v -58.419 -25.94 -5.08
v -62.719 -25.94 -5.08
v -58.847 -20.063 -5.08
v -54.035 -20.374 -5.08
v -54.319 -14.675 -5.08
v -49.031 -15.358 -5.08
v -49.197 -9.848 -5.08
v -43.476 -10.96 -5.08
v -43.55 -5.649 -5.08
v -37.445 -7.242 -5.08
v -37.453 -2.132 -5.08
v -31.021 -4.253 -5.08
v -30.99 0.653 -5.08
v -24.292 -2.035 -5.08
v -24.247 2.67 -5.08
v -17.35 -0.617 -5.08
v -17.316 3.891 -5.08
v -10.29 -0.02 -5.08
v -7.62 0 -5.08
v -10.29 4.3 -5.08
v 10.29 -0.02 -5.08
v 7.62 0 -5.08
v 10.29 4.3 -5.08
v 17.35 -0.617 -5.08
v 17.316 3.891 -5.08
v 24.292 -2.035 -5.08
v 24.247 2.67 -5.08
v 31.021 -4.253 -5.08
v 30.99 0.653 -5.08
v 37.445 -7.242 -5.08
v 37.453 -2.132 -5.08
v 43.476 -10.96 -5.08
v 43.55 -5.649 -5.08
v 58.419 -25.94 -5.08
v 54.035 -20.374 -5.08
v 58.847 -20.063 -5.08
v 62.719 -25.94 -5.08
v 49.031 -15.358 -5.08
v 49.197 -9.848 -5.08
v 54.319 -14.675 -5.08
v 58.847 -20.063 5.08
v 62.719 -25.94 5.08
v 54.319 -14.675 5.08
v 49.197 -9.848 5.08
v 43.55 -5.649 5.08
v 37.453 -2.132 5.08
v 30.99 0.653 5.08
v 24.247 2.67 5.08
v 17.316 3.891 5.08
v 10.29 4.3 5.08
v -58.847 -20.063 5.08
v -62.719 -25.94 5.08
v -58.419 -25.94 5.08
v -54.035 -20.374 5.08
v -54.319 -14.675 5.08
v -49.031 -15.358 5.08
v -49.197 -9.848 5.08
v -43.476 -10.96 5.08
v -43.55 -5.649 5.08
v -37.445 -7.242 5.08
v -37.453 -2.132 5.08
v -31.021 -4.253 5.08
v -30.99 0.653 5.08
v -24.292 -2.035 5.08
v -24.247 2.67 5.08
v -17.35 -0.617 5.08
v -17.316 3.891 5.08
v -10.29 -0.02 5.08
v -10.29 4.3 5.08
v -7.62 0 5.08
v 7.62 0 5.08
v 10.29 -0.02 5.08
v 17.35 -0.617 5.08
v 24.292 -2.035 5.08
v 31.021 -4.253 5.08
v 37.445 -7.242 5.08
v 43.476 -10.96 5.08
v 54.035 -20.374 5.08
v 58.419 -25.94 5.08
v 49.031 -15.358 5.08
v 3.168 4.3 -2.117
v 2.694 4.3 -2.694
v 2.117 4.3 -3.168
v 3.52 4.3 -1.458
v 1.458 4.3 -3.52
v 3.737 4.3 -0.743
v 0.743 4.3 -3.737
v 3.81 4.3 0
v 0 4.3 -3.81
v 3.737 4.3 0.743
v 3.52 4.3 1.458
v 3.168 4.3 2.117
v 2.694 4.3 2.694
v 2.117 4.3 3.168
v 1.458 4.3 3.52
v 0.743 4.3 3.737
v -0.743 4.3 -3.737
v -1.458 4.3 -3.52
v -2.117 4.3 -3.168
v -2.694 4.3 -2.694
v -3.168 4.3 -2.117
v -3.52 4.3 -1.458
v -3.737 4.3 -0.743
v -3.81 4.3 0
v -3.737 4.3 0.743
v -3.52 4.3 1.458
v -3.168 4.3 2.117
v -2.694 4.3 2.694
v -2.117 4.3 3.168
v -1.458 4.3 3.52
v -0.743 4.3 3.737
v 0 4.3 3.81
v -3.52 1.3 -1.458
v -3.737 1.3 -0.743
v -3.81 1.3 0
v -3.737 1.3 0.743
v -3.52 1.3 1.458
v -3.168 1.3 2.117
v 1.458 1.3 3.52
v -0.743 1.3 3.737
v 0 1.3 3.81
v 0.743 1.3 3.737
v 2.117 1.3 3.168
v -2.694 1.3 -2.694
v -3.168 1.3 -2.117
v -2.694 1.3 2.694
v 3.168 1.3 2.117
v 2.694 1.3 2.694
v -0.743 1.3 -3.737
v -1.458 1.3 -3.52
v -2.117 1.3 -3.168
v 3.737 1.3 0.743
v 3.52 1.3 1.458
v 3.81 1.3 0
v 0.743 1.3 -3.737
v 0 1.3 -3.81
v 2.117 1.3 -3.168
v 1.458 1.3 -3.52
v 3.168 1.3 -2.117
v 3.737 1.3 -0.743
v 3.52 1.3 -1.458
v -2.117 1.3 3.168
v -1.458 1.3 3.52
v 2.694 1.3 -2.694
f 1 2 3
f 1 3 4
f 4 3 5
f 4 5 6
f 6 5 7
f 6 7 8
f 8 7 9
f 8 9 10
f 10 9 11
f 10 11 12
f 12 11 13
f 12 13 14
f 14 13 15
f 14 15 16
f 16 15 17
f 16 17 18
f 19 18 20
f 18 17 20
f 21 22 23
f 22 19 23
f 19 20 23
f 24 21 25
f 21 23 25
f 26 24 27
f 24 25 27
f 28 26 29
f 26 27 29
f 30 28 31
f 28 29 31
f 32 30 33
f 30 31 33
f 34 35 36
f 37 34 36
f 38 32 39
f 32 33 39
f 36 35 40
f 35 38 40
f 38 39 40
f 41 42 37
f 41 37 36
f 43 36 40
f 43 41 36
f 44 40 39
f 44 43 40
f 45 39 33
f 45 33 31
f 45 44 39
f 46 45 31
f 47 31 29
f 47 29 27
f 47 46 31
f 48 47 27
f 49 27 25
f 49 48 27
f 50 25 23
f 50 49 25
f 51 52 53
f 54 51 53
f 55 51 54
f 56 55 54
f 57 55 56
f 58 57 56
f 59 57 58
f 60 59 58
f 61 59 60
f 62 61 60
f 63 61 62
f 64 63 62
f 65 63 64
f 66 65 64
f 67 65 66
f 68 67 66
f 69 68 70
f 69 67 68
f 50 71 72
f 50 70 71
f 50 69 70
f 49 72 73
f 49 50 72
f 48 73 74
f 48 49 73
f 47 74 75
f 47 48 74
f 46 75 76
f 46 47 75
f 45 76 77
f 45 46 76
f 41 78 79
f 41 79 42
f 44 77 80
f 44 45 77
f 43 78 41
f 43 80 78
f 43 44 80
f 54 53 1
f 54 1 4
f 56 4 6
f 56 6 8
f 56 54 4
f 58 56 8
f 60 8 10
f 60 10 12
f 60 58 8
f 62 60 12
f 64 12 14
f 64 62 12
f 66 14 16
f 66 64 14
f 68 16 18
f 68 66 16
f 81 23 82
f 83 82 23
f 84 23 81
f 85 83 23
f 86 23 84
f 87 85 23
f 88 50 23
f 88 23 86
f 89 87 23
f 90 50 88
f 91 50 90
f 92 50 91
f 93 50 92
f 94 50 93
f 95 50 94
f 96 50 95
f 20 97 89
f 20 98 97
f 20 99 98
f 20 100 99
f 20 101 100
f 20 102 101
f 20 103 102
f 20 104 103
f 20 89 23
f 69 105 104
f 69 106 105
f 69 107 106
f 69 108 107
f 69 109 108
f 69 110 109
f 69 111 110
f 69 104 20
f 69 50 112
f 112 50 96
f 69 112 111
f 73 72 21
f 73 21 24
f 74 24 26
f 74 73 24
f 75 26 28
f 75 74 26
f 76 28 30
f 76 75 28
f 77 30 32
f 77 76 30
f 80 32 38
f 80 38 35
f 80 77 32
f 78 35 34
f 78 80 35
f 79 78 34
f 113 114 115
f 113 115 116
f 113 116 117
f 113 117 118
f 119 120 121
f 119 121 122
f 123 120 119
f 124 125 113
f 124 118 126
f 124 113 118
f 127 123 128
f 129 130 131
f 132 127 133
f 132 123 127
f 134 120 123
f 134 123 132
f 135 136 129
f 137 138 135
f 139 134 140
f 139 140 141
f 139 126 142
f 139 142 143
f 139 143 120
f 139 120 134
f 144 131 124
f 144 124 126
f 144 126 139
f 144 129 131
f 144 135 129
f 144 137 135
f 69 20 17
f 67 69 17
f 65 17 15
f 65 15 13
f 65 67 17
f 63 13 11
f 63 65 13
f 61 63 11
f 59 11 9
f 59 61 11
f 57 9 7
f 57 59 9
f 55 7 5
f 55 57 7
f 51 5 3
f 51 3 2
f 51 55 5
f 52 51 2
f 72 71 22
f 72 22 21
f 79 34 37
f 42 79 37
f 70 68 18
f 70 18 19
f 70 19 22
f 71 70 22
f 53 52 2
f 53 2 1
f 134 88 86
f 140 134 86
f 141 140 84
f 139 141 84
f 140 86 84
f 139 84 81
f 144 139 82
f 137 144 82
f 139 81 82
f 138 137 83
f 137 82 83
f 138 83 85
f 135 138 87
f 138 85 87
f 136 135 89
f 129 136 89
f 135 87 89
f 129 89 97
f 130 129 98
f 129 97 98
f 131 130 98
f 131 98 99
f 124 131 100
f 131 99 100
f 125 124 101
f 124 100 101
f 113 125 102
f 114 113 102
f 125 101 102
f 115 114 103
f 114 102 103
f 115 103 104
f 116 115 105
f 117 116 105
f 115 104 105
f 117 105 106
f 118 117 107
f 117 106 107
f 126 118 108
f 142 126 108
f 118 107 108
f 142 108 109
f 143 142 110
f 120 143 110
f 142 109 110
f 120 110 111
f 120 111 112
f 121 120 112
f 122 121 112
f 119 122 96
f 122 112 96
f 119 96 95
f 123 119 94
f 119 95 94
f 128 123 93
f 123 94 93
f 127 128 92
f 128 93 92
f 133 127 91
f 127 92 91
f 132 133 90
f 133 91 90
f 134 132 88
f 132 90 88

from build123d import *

# Parameters (mm, degrees)
SKETCH1_W           = 15.24
SKETCH1_H           = 10.16
BOSS_EXTRUDE1_DEPTH = 4.3
BOSS_EXTRUDE2_DEPTH = 10.16
SKETCH3_R           = 3.81
CUT_EXTRUDE1_DEPTH  = 3


with BuildPart() as part:
    # Sketch1 → Boss-Extrude1 (new body)
    with BuildSketch(Plane(origin=(0, 0, 0), x_dir=(1, 0, 0), z_dir=(0, 1, 0))):
        Rectangle(SKETCH1_W, SKETCH1_H)
    extrude(amount=BOSS_EXTRUDE1_DEPTH)

    # Sketch2 → Boss-Extrude2 (add)
    with BuildSketch(Plane.XY.offset(5.08)):
        with BuildLine():
            Line((7.62, 4.3), (7.62, 0))
            Line((7.62, 0), (10.29, -0.020216112))
            ThreePointArc((10.29, -0.020216112), (37.444945357, -7.24175572), (58.419152196, -25.94))
            Line((58.419152196, -25.94), (62.719152196, -25.94))
            ThreePointArc((62.719152196, -25.94), (40.552491636, -3.80185252), (10.29, 4.3))
            Line((10.29, 4.3), (7.62, 4.3))
        make_face()
        with BuildLine():
            ThreePointArc((-10.29, 4.3), (-40.552491636, -3.80185252), (-62.719152196, -25.94))
            Line((-62.719152196, -25.94), (-58.419152196, -25.94))
            ThreePointArc((-58.419152196, -25.94), (-37.444945357, -7.24175572), (-10.29, -0.020216112))
            Line((-10.29, -0.020216112), (-7.62, 0))
            Line((-7.62, 0), (-7.62, 4.3))
            Line((-7.62, 4.3), (-10.29, 4.3))
        make_face()
    extrude(amount=-BOSS_EXTRUDE2_DEPTH)

    # Sketch3 → Cut-Extrude1 (cut)
    with BuildSketch(Plane(origin=(0, 4.3, 0), x_dir=(1, 0, 0), z_dir=(0, 1, 0))):
        Circle(SKETCH3_R)
    extrude(amount=-CUT_EXTRUDE1_DEPTH, mode=Mode.SUBTRACT)


solid = part.part
